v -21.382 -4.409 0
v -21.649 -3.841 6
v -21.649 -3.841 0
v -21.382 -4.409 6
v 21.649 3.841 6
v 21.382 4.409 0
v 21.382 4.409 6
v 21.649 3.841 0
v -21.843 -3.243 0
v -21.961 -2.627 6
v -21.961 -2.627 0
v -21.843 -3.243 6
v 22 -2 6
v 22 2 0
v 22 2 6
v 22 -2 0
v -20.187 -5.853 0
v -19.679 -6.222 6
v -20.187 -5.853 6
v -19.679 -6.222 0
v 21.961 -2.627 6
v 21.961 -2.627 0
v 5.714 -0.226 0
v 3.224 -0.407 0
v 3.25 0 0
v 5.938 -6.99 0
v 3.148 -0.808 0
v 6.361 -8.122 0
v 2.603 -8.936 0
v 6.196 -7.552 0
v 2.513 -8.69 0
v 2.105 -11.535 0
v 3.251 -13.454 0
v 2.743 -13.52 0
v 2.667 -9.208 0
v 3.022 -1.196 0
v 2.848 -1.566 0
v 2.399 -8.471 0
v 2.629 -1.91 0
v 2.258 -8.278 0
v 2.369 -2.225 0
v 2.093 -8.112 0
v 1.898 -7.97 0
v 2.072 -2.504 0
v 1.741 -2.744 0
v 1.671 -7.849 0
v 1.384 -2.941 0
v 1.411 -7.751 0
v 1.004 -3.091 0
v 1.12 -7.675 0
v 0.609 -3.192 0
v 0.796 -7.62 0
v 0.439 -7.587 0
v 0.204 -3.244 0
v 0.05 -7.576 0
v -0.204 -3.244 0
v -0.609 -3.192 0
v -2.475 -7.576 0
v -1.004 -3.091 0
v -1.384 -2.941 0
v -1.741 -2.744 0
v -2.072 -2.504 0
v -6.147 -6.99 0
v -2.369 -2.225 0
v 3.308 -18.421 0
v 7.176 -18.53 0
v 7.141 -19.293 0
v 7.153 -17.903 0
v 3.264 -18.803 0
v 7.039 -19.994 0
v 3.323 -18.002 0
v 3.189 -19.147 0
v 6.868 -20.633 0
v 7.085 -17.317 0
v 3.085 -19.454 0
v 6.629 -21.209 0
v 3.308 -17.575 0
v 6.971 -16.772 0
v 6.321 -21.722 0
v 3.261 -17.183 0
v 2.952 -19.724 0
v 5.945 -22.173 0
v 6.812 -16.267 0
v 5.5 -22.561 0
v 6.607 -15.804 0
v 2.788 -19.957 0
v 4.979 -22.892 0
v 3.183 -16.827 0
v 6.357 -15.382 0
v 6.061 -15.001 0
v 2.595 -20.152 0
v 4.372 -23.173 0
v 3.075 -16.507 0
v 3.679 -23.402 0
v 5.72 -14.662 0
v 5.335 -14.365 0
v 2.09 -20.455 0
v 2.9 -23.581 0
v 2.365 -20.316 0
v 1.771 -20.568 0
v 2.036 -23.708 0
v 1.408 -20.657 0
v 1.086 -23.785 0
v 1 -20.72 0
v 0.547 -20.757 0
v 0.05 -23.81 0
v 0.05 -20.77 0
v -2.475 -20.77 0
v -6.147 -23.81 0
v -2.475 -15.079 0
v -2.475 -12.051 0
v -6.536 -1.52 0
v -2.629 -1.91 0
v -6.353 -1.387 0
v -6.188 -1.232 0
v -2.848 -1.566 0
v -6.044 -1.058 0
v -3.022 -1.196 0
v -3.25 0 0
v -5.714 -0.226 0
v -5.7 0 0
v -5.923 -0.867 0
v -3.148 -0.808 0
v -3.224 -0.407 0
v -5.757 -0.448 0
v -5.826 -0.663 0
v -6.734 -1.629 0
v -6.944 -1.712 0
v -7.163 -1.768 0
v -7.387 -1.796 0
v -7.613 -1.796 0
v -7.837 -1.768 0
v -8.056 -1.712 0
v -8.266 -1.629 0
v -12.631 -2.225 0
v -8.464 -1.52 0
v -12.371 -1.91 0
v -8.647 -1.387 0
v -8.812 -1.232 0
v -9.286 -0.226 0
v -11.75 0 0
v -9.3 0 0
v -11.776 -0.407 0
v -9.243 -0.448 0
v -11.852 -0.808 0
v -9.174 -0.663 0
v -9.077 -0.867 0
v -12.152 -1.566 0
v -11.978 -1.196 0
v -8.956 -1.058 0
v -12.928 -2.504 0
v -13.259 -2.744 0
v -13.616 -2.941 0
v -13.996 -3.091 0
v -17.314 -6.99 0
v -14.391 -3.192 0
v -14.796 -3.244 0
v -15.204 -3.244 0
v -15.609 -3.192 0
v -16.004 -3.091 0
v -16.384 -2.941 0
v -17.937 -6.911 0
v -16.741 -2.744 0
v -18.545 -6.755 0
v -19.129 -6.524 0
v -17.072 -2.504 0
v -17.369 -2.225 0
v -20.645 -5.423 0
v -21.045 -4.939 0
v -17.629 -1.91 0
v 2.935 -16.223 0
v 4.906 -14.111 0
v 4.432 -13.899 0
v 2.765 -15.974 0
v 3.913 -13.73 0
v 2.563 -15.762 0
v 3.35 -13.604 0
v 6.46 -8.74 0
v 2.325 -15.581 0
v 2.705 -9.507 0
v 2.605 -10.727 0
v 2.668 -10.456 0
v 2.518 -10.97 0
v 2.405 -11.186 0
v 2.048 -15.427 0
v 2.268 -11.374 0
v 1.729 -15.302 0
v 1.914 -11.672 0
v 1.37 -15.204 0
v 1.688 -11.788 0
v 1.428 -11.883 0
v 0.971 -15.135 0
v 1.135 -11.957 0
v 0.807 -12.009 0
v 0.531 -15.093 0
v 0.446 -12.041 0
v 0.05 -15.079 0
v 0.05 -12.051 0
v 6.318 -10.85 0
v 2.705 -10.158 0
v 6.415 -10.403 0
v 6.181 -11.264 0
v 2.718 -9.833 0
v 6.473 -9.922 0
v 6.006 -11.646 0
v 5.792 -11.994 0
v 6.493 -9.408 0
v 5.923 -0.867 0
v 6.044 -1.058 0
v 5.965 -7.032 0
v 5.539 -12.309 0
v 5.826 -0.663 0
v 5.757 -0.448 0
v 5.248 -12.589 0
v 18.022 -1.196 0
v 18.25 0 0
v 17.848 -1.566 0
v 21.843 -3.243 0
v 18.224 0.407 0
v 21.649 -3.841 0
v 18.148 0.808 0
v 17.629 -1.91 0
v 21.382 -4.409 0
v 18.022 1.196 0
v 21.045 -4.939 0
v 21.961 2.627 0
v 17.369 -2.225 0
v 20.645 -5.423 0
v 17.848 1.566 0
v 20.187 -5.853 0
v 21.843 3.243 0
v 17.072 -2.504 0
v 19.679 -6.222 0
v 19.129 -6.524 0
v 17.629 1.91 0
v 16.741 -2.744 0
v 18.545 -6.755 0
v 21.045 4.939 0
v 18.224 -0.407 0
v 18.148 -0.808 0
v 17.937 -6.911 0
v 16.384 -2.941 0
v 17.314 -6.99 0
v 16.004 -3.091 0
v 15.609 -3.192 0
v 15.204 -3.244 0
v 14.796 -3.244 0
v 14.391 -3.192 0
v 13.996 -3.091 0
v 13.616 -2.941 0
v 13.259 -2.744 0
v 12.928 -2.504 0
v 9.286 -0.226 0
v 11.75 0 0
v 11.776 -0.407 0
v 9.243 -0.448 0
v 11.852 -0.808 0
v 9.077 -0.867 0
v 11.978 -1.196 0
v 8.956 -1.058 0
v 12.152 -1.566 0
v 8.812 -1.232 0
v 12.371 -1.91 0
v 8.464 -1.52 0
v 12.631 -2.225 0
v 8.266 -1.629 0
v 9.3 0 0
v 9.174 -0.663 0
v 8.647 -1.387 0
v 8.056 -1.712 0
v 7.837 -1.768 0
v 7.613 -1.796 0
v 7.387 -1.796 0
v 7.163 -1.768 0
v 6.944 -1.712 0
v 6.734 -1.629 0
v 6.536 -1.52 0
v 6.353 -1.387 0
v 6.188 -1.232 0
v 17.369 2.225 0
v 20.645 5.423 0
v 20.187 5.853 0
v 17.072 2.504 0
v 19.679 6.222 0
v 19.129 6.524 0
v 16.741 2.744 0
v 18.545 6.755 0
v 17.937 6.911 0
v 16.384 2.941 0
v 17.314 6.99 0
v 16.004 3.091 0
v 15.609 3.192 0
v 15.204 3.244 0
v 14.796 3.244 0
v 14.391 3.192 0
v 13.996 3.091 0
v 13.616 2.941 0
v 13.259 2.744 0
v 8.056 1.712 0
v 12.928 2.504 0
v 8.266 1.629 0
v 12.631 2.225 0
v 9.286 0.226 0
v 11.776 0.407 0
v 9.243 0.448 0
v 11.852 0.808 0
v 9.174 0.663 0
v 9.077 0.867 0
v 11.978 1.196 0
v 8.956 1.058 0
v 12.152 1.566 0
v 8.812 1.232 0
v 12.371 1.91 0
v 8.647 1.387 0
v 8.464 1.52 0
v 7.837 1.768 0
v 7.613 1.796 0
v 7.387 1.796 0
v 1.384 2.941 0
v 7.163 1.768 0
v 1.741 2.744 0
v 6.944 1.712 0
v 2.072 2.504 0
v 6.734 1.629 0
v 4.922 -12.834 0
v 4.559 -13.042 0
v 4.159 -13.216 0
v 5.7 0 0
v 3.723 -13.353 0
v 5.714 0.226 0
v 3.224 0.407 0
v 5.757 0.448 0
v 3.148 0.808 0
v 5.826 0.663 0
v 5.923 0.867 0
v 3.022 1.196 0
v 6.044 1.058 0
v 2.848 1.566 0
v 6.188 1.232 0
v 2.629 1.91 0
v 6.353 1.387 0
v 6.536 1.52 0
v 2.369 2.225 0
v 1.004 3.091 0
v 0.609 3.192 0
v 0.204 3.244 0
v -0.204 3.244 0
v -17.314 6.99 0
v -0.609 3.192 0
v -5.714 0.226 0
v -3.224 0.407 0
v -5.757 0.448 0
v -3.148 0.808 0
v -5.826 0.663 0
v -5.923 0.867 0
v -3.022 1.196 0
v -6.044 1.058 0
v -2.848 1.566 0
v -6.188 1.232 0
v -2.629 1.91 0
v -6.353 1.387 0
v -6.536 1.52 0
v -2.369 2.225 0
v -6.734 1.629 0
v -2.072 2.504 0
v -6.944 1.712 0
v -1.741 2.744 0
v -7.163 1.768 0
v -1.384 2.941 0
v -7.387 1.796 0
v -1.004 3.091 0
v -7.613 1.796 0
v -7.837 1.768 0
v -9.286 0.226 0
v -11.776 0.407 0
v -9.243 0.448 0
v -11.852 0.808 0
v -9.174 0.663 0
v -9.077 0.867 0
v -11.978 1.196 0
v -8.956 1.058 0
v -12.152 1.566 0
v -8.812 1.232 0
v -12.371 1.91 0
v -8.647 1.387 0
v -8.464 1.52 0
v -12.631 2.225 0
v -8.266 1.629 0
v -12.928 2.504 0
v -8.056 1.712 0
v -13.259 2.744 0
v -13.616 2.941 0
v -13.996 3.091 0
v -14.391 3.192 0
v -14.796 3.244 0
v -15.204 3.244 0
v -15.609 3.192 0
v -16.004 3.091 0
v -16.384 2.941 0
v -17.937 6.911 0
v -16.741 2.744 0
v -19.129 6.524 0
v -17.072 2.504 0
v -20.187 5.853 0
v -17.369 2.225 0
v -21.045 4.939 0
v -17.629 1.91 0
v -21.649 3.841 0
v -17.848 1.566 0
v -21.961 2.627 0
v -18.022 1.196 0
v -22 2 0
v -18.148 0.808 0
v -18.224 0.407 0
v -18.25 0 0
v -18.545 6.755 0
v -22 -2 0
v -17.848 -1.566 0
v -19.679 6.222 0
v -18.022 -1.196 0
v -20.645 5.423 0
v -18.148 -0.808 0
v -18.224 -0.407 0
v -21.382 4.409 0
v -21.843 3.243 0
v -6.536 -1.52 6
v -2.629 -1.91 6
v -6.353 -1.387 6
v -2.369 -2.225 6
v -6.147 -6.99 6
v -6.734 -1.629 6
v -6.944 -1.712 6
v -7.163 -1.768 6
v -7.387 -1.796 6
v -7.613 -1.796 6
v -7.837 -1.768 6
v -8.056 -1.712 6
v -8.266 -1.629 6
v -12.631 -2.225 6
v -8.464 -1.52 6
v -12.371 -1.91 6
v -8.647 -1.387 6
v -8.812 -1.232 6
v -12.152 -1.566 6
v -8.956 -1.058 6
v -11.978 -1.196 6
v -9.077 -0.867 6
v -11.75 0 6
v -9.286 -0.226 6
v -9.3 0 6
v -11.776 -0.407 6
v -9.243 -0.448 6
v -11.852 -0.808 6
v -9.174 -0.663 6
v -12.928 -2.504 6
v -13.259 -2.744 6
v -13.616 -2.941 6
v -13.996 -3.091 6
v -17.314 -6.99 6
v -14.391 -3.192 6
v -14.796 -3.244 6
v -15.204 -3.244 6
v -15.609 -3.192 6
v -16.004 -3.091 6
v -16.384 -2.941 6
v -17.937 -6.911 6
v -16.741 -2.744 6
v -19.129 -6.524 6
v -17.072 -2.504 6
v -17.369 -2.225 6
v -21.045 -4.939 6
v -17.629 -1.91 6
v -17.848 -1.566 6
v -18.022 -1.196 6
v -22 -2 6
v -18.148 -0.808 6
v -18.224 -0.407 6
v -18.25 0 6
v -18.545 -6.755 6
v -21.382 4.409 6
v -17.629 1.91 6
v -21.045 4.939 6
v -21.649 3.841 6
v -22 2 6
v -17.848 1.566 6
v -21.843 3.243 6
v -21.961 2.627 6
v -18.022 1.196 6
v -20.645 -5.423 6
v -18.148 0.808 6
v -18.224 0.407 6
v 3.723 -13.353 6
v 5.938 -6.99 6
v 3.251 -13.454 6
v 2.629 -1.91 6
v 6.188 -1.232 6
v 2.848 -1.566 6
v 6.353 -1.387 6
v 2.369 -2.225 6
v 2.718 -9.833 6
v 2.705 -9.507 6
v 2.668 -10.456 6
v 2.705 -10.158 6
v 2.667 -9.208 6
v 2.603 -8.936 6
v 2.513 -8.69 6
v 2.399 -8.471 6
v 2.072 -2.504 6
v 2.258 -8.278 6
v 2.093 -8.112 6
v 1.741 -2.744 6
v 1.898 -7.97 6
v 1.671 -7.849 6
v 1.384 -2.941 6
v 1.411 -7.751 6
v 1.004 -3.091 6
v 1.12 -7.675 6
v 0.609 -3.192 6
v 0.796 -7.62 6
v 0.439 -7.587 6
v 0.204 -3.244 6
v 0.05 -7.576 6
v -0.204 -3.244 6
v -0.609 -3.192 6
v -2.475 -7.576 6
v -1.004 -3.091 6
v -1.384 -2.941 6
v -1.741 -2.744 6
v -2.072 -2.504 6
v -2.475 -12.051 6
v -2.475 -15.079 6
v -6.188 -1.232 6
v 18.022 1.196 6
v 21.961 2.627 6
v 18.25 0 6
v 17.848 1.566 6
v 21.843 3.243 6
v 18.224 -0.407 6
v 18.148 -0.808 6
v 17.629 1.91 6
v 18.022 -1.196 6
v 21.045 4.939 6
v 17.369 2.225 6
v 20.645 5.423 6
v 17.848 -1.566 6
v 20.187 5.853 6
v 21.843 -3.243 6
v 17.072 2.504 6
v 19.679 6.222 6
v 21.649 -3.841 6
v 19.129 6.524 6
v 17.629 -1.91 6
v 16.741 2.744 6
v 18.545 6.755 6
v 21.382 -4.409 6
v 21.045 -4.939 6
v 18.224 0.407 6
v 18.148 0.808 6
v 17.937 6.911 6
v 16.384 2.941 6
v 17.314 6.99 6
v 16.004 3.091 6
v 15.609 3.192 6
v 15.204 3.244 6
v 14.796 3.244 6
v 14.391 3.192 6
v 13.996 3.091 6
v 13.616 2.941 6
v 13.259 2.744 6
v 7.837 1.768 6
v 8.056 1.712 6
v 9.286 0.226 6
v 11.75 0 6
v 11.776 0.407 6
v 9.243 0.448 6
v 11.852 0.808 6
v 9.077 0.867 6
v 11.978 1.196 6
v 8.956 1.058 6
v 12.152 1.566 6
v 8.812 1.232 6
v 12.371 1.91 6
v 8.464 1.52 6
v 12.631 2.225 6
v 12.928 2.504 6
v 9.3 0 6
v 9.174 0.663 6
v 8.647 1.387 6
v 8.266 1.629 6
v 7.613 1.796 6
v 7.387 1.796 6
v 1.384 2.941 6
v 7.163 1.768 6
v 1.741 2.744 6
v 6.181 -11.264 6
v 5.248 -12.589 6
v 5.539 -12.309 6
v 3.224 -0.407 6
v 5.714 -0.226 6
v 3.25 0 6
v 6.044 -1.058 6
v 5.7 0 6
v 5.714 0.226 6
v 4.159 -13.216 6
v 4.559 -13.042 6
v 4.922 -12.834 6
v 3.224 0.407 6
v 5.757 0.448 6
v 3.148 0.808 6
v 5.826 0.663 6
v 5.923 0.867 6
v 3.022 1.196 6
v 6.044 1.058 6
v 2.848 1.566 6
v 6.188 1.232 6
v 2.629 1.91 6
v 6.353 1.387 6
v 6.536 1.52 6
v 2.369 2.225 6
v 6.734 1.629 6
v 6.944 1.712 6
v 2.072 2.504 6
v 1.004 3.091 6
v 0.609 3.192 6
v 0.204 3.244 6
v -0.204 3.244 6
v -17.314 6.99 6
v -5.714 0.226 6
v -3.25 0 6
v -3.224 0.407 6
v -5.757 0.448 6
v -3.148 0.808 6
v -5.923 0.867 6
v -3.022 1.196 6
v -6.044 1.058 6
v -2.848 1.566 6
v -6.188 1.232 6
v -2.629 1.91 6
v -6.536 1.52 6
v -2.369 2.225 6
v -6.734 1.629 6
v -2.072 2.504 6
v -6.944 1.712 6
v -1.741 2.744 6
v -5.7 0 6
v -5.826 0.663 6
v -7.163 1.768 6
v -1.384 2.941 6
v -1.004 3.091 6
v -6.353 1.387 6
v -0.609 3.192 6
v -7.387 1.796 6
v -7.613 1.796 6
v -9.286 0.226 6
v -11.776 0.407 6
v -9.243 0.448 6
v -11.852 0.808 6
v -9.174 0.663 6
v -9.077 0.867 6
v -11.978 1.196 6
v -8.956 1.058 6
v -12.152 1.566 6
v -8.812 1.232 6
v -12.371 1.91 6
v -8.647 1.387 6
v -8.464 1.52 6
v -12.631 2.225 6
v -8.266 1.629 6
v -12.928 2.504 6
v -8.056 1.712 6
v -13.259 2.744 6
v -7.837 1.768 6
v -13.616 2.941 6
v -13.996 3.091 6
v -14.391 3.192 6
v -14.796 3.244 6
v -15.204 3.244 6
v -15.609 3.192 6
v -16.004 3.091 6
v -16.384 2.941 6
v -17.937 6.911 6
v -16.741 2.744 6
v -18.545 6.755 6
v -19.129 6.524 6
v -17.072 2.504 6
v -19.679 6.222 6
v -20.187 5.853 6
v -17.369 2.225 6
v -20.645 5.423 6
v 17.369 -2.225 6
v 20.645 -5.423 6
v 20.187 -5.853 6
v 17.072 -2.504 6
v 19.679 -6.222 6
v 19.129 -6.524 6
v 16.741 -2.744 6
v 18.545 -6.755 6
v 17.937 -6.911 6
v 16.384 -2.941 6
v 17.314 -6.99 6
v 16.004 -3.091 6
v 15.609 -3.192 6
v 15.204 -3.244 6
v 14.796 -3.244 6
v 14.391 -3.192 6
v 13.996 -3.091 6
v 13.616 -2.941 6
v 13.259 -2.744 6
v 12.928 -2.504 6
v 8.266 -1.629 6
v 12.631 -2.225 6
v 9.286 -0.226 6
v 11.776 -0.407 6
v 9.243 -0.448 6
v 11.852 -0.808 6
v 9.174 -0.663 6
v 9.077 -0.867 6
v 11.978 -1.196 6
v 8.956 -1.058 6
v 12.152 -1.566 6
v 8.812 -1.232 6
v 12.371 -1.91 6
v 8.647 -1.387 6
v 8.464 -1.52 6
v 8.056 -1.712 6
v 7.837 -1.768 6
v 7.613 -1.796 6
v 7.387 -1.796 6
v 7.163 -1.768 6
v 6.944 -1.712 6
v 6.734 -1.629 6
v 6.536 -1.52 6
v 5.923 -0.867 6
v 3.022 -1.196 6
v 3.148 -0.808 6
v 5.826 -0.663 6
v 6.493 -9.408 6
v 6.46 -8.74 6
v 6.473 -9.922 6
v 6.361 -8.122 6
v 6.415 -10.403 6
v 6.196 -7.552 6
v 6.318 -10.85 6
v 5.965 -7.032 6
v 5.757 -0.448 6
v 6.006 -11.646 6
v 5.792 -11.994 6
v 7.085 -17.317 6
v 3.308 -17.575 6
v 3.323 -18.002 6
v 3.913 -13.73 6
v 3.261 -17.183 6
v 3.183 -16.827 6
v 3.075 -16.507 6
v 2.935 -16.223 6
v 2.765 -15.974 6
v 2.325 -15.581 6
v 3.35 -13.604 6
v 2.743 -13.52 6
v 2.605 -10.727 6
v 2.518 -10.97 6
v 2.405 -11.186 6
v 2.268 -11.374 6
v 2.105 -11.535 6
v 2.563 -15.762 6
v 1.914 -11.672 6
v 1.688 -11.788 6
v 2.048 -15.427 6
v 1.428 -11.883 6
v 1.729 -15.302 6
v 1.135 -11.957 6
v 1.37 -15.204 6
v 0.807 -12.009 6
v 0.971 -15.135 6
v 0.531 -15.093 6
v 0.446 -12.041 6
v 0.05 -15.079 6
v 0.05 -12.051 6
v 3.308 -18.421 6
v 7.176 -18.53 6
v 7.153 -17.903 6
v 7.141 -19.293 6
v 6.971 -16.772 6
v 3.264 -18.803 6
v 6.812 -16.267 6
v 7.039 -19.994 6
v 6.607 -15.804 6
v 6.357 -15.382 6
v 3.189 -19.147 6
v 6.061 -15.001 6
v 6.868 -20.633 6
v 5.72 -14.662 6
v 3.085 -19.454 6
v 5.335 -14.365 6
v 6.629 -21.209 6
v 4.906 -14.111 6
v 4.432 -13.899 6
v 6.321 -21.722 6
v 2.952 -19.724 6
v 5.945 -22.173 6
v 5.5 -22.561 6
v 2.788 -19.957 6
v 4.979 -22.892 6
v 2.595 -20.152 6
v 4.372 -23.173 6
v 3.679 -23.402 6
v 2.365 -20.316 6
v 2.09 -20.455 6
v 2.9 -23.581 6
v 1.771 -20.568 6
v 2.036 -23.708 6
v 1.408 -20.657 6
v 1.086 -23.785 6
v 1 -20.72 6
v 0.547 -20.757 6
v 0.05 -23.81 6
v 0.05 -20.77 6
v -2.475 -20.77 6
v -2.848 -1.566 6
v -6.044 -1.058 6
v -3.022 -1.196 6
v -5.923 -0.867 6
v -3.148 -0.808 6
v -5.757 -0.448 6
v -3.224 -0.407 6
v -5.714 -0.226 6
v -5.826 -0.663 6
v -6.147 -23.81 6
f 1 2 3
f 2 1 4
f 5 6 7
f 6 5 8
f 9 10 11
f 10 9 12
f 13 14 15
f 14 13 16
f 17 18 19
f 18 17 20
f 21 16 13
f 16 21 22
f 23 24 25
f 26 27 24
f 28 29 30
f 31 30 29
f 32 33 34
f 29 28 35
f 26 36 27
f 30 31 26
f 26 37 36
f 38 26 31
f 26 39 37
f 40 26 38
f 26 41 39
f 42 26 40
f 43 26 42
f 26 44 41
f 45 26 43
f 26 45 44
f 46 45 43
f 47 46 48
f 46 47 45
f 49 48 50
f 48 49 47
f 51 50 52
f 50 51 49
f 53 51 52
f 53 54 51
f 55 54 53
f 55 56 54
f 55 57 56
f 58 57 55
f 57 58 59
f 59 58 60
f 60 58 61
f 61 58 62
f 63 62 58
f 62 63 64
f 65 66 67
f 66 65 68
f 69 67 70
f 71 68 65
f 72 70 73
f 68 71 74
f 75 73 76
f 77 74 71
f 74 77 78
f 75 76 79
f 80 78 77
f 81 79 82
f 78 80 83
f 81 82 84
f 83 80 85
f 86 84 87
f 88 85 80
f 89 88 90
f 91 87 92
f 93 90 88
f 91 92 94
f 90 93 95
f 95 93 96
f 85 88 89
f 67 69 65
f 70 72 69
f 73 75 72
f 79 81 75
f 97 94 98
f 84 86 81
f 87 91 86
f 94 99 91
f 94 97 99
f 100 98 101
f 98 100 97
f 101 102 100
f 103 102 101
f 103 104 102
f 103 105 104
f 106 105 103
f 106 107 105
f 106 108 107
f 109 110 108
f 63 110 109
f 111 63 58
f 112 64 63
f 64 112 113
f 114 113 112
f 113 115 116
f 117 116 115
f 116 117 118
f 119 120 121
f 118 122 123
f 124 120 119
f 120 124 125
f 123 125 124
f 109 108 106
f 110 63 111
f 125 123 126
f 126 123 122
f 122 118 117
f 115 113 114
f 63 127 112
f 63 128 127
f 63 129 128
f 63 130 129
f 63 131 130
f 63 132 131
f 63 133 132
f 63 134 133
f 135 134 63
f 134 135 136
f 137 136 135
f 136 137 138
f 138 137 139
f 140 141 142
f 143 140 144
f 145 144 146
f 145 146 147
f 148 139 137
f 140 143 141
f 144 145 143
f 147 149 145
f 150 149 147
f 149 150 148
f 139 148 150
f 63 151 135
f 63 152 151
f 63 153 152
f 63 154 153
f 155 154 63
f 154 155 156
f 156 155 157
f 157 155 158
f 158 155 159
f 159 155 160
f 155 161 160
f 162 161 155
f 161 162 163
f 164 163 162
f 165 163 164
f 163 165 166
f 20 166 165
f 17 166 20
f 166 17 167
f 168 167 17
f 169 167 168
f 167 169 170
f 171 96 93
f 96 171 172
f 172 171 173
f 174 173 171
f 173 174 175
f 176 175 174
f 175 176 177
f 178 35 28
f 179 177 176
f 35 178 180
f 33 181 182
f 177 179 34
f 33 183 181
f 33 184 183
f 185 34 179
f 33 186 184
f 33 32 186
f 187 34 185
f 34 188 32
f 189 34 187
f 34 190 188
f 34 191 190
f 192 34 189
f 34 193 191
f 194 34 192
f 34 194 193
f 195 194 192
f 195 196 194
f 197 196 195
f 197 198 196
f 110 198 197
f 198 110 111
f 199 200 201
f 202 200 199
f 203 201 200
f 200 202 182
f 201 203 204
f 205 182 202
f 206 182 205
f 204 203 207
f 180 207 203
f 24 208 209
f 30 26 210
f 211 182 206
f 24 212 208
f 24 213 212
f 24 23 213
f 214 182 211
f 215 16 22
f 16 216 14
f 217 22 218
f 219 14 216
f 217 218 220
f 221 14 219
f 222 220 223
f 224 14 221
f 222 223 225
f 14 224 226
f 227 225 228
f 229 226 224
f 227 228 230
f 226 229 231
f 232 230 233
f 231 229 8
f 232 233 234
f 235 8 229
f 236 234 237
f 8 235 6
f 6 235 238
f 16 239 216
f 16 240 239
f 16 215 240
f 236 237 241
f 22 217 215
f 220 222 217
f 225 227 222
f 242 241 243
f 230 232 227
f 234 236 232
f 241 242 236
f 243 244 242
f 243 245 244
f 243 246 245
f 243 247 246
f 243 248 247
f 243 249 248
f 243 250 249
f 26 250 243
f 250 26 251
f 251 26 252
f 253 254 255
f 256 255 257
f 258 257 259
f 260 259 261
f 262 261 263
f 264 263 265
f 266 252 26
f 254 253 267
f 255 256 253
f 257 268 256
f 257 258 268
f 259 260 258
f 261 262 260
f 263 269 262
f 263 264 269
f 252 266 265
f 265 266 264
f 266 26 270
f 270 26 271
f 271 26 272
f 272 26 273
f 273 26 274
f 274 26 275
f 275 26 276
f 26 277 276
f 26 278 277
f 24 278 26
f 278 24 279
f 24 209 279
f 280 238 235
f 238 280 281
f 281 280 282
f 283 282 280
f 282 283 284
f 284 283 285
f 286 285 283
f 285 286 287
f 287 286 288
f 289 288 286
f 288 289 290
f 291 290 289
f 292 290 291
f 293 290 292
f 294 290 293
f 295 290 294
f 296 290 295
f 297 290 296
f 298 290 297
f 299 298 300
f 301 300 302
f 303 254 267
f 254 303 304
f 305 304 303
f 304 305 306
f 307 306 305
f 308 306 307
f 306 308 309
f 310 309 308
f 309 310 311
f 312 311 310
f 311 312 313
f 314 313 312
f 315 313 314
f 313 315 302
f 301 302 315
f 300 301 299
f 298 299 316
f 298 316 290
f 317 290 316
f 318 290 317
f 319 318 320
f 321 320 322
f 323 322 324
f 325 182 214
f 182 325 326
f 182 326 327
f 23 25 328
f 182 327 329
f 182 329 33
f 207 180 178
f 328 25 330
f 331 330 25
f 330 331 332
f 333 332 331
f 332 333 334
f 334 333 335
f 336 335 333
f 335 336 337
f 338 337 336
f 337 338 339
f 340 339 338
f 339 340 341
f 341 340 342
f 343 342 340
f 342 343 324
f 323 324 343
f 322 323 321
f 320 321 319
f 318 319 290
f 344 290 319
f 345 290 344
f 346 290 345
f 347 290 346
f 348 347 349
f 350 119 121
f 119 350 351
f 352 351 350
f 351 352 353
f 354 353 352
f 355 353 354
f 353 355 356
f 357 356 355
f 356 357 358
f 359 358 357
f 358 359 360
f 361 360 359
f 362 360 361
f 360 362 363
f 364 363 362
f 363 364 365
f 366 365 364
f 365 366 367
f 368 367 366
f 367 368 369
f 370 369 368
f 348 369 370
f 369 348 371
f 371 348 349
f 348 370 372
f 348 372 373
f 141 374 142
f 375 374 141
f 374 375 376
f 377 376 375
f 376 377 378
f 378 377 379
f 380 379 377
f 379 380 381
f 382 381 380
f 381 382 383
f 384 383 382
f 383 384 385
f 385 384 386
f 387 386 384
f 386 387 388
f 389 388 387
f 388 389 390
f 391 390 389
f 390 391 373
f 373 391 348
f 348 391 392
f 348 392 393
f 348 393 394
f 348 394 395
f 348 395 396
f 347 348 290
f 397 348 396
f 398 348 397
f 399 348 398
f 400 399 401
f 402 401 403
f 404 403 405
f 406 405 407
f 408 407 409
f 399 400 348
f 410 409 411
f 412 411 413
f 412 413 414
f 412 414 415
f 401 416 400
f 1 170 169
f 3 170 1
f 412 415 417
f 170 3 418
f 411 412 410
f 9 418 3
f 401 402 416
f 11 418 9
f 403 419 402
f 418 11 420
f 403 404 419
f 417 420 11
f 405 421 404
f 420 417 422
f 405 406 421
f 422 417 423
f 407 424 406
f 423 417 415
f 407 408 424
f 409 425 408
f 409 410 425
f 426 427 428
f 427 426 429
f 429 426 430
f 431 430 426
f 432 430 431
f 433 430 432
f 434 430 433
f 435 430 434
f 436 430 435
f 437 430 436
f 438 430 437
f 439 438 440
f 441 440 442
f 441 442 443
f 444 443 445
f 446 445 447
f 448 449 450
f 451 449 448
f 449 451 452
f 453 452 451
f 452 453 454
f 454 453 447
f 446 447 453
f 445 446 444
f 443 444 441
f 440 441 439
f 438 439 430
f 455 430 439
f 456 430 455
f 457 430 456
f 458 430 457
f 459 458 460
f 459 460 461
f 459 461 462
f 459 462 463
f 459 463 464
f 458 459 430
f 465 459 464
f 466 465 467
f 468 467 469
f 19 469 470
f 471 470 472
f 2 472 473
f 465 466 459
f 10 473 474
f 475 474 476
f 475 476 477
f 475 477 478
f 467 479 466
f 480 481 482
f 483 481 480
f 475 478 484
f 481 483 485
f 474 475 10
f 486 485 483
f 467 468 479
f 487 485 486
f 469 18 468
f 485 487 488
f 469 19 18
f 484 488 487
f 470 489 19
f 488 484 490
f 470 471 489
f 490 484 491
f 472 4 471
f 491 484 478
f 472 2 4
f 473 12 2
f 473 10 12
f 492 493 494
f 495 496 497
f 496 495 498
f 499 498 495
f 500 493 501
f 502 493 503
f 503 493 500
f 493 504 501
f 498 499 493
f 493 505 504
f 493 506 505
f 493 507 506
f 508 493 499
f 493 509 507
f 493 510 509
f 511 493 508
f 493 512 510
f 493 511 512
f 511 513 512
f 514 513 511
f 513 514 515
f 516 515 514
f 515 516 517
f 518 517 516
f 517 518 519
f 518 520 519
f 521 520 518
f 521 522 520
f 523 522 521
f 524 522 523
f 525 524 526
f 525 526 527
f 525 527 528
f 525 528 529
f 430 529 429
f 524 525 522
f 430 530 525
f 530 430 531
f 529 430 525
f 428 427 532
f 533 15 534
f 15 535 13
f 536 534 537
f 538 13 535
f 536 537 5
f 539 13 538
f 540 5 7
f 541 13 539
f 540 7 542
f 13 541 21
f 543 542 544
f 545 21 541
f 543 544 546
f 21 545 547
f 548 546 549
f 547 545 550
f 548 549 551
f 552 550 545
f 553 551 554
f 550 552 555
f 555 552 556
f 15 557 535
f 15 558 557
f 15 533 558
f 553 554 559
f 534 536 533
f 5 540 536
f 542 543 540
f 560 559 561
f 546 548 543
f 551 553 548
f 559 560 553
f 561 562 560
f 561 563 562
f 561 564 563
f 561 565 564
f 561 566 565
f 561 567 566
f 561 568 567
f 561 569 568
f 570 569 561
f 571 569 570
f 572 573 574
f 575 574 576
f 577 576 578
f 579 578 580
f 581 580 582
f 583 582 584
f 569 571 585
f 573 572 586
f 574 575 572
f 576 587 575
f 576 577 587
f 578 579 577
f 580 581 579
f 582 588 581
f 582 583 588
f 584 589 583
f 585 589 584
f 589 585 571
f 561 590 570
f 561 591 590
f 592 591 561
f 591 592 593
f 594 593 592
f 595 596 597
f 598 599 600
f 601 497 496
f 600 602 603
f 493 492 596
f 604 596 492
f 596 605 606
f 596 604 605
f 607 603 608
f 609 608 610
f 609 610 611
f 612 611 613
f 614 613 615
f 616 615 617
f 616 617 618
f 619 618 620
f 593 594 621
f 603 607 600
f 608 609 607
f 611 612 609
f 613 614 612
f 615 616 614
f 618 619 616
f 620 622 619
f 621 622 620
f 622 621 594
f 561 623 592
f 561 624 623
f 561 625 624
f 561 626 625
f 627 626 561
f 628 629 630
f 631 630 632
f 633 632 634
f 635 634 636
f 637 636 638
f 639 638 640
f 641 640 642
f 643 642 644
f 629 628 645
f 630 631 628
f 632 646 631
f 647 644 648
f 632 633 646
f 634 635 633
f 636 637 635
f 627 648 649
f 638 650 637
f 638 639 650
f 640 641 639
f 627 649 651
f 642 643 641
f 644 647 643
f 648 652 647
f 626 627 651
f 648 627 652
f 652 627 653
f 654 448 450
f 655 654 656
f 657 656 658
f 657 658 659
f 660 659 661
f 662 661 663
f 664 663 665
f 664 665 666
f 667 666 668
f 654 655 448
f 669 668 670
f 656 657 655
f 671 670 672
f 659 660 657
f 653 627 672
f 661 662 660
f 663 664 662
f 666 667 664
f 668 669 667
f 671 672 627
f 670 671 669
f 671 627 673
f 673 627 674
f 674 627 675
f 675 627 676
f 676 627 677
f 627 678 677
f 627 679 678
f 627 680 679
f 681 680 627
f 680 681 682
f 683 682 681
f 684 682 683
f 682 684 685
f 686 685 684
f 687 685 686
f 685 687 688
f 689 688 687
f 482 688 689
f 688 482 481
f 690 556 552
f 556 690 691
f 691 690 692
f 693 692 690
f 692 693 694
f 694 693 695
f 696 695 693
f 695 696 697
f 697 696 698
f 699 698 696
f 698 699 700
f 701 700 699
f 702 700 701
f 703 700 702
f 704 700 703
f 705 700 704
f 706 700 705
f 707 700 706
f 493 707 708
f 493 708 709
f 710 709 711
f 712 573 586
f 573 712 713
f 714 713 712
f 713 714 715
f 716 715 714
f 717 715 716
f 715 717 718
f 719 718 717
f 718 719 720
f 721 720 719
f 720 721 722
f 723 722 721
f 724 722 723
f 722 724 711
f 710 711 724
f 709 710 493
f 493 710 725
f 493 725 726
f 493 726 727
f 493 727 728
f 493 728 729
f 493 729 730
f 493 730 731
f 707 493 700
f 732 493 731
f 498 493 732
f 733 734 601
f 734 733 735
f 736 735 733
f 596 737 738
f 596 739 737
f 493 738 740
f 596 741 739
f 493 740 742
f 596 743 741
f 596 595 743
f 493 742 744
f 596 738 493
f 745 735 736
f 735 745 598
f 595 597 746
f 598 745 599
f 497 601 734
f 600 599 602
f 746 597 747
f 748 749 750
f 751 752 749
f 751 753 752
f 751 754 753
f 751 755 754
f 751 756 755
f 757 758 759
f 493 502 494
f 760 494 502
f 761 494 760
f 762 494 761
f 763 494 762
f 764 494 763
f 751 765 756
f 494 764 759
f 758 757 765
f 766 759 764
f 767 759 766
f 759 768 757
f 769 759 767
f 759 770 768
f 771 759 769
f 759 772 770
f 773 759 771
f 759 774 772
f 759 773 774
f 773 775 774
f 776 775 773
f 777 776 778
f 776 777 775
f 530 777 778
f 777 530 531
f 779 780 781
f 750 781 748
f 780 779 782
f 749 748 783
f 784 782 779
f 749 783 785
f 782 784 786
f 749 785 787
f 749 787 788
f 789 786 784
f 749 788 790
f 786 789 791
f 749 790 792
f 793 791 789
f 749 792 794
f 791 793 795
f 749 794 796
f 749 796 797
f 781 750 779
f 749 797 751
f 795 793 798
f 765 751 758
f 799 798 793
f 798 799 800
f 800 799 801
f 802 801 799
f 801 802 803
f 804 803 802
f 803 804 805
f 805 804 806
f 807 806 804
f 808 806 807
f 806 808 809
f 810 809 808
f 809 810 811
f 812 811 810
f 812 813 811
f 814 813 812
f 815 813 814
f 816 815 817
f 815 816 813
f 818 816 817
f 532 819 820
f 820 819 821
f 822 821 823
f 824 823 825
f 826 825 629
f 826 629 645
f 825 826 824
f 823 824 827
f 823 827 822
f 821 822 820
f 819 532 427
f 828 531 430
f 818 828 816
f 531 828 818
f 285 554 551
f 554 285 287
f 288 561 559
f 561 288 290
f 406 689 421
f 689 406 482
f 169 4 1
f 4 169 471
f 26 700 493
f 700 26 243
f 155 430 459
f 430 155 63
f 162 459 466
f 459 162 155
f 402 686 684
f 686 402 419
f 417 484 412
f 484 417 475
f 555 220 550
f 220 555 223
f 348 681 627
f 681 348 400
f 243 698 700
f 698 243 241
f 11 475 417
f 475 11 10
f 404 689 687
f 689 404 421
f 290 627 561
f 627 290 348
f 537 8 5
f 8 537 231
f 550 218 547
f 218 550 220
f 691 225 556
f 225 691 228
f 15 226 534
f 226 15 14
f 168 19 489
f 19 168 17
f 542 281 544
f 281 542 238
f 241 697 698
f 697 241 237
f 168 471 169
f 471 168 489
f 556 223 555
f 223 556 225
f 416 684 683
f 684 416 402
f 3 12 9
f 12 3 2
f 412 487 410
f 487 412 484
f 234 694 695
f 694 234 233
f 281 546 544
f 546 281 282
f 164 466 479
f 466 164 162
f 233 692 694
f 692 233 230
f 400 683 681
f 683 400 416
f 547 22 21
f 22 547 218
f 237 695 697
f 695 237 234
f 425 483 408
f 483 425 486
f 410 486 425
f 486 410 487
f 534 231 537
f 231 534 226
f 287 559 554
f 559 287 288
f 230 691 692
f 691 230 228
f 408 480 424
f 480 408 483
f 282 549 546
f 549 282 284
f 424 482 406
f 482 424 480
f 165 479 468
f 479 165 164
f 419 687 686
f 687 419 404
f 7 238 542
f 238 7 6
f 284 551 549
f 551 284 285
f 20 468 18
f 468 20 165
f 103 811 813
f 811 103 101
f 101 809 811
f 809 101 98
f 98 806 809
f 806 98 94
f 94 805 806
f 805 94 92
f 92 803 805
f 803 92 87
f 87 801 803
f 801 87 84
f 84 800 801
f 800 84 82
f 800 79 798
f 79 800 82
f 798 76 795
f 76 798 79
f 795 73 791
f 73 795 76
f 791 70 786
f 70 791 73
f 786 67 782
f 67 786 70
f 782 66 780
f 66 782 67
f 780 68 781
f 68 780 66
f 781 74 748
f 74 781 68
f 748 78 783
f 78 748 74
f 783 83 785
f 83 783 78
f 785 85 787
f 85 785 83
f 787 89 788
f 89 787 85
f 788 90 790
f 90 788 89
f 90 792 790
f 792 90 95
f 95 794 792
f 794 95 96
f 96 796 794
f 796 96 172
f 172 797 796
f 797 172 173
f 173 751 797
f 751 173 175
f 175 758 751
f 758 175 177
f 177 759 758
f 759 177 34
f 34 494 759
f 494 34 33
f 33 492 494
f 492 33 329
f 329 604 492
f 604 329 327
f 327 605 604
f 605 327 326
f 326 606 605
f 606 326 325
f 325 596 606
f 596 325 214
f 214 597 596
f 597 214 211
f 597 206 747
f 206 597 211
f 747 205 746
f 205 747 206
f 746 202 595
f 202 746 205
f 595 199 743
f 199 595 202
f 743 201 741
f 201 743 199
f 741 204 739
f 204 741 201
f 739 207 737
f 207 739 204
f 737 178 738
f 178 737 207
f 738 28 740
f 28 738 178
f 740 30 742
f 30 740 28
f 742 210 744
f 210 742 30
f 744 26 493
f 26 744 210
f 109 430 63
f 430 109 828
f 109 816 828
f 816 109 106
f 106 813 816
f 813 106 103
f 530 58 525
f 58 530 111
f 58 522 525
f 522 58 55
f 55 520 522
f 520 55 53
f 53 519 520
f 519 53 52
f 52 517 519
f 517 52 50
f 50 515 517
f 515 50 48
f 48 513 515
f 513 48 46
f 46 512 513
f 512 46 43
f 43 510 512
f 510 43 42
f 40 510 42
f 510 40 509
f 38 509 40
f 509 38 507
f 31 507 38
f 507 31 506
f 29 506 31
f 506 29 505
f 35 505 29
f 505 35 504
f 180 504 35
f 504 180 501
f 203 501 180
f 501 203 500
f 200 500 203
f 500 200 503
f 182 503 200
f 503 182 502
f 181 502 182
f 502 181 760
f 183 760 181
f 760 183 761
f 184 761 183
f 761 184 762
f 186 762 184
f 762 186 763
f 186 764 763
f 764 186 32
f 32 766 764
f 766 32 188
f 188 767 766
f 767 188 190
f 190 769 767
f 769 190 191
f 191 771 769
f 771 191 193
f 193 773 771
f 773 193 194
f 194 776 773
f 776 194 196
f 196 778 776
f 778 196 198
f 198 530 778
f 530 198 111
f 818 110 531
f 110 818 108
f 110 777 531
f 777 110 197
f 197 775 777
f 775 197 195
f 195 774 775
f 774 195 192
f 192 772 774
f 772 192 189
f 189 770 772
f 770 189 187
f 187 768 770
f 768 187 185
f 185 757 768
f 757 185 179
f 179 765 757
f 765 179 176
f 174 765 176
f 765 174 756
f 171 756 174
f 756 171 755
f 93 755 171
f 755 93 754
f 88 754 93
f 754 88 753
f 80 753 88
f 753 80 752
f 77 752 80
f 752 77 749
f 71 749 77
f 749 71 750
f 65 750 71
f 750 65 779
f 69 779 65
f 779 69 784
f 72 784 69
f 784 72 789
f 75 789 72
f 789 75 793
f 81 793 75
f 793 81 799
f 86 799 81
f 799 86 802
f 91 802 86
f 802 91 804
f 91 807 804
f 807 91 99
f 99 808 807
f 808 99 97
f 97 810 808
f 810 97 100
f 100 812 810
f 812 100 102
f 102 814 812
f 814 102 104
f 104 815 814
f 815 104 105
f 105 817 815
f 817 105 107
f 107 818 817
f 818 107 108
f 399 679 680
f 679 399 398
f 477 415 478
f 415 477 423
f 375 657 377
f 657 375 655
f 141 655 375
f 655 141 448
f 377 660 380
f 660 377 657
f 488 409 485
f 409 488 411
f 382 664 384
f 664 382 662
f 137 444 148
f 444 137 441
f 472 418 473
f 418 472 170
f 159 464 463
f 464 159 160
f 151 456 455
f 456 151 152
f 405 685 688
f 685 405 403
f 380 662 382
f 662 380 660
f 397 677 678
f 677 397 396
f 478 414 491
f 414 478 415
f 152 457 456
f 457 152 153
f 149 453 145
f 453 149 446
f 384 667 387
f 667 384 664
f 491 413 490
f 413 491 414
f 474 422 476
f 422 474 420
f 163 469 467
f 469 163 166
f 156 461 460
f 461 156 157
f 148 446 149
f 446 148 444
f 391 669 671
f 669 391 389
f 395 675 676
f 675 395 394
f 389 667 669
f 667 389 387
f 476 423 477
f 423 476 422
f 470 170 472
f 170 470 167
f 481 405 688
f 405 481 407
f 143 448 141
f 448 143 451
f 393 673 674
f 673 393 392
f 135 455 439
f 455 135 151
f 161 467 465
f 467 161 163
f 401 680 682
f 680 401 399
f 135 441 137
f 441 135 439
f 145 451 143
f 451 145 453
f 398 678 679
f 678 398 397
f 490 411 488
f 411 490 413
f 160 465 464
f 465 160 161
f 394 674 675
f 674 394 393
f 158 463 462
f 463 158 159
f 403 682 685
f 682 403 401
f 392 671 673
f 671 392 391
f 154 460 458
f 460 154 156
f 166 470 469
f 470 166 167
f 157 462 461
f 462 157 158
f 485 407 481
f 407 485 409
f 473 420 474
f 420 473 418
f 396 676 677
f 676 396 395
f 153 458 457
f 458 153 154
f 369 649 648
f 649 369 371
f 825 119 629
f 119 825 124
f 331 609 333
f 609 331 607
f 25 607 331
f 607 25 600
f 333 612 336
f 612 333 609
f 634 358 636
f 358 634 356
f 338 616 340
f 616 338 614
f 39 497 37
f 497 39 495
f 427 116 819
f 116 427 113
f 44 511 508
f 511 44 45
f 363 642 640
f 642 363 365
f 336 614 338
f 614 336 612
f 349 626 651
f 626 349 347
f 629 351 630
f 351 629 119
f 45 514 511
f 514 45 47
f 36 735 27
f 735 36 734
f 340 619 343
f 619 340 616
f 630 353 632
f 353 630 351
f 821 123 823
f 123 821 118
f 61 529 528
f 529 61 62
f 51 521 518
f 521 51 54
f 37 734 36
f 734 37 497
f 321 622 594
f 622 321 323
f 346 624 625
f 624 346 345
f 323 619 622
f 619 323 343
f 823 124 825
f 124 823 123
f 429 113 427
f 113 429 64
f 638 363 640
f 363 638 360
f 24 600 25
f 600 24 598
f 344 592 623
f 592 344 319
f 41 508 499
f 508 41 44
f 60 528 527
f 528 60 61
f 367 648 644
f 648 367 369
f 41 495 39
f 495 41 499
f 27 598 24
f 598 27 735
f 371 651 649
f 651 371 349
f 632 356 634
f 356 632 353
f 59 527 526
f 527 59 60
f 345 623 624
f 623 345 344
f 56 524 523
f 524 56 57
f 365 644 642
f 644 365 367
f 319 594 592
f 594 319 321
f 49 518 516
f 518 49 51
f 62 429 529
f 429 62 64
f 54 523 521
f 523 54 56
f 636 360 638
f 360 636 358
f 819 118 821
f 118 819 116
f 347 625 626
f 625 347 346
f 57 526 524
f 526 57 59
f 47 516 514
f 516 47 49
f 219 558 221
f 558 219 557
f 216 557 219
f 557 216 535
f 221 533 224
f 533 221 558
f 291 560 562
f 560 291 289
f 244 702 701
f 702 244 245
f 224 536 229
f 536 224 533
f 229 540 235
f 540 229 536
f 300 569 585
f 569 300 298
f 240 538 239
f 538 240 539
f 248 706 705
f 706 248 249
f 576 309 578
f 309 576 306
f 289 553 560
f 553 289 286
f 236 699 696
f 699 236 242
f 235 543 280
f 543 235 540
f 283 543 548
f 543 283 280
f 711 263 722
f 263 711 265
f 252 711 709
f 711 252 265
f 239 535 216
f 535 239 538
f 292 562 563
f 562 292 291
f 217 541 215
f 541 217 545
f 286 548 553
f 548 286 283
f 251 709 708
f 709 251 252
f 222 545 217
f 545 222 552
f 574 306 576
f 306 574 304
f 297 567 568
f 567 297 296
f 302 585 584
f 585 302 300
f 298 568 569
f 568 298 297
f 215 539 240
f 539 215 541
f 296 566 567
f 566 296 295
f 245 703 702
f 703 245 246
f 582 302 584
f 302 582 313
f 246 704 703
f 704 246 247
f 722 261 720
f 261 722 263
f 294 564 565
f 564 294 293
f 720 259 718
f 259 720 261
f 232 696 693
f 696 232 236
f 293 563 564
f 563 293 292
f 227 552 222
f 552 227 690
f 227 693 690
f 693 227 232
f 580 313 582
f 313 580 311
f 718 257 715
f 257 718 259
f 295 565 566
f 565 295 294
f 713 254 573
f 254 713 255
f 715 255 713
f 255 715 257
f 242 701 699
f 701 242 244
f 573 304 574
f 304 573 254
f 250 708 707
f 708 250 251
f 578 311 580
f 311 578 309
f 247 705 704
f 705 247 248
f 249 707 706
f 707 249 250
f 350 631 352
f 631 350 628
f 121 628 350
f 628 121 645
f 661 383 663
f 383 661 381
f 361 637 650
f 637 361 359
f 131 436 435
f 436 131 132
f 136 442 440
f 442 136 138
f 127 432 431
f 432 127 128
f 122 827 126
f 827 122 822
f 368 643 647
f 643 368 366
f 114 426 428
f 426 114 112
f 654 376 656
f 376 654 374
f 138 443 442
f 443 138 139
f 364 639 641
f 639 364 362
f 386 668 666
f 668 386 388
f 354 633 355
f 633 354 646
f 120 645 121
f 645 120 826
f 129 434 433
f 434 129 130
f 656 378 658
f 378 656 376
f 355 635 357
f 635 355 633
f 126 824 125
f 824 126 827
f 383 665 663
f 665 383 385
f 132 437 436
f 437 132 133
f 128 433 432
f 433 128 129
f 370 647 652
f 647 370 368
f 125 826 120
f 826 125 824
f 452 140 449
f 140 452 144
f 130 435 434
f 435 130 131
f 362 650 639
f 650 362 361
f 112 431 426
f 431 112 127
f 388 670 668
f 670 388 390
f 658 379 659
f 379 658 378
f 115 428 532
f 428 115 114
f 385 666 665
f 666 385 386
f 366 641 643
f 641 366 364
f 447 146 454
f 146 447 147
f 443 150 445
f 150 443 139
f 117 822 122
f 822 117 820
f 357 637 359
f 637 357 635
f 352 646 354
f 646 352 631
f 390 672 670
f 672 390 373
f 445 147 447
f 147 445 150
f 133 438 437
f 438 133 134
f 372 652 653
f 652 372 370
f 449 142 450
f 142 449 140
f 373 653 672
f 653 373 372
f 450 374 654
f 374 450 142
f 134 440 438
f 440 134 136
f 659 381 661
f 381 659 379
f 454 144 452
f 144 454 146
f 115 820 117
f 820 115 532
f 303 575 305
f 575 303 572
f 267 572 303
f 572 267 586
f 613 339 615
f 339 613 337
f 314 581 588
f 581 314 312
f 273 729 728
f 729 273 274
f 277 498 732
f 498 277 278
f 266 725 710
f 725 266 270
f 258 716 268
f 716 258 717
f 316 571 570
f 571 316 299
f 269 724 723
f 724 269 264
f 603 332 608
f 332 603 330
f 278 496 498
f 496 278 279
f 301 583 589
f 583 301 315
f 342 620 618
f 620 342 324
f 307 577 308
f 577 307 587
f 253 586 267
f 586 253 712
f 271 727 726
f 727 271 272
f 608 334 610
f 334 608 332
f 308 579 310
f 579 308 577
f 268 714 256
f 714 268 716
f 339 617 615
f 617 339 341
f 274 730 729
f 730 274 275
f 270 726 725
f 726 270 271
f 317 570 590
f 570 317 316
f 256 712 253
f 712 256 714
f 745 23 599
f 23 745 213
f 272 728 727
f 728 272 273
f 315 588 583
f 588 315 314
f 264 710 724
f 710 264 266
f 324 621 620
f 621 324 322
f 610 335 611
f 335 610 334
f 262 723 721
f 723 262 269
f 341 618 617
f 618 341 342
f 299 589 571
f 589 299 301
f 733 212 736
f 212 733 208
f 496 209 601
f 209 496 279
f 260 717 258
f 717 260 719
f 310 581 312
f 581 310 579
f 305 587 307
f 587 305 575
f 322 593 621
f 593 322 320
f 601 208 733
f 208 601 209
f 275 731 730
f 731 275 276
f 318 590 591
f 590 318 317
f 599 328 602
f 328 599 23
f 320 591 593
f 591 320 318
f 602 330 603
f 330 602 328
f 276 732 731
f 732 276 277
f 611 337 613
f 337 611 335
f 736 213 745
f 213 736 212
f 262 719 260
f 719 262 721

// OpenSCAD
$fn = 50;


difference() {
	union() {
		hull() {
			translate(v = [-17.0000000000, 2.0000000000, 0]) {
				cylinder(h = 6, r = 5);
			}
			translate(v = [17.0000000000, 2.0000000000, 0]) {
				cylinder(h = 6, r = 5);
			}
			translate(v = [-17.0000000000, -2.0000000000, 0]) {
				cylinder(h = 6, r = 5);
			}
			translate(v = [17.0000000000, -2.0000000000, 0]) {
				cylinder(h = 6, r = 5);
			}
		}
		translate(v = [0, -5, 0]) {
			linear_extrude(height = 6) {
				text(font = "DejaVu Sans Mono:style=Bold", halign = "center", size = 19.0000000000, text = "B", valign = "top");
			}
		}
	}
	union() {
		translate(v = [-15.0000000000, 0.0000000000, 0]) {
			translate(v = [0, 0, -100]) {
				cylinder(h = 200, r = 3.2500000000);
			}
		}
		translate(v = [0, 0, -100]) {
			cylinder(h = 200, r = 3.2500000000);
		}
		translate(v = [15.0000000000, 0.0000000000, 0]) {
			translate(v = [0, 0, -100]) {
				cylinder(h = 200, r = 3.2500000000);
			}
		}
		translate(v = [-15.0000000000, 0.0000000000, 0]) {
			translate(v = [0, 0, -100]) {
				cylinder(h = 200, r = 1.8000000000);
			}
		}
		translate(v = [-7.5000000000, 0.0000000000, 0]) {
			translate(v = [0, 0, -100]) {
				cylinder(h = 200, r = 1.8000000000);
			}
		}
		translate(v = [0, 0, -100]) {
			cylinder(h = 200, r = 1.8000000000);
		}
		translate(v = [7.5000000000, 0.0000000000, 0]) {
			translate(v = [0, 0, -100]) {
				cylinder(h = 200, r = 1.8000000000);
			}
		}
		translate(v = [15.0000000000, 0.0000000000, 0]) {
			translate(v = [0, 0, -100]) {
				cylinder(h = 200, r = 1.8000000000);
			}
		}
	}
}
